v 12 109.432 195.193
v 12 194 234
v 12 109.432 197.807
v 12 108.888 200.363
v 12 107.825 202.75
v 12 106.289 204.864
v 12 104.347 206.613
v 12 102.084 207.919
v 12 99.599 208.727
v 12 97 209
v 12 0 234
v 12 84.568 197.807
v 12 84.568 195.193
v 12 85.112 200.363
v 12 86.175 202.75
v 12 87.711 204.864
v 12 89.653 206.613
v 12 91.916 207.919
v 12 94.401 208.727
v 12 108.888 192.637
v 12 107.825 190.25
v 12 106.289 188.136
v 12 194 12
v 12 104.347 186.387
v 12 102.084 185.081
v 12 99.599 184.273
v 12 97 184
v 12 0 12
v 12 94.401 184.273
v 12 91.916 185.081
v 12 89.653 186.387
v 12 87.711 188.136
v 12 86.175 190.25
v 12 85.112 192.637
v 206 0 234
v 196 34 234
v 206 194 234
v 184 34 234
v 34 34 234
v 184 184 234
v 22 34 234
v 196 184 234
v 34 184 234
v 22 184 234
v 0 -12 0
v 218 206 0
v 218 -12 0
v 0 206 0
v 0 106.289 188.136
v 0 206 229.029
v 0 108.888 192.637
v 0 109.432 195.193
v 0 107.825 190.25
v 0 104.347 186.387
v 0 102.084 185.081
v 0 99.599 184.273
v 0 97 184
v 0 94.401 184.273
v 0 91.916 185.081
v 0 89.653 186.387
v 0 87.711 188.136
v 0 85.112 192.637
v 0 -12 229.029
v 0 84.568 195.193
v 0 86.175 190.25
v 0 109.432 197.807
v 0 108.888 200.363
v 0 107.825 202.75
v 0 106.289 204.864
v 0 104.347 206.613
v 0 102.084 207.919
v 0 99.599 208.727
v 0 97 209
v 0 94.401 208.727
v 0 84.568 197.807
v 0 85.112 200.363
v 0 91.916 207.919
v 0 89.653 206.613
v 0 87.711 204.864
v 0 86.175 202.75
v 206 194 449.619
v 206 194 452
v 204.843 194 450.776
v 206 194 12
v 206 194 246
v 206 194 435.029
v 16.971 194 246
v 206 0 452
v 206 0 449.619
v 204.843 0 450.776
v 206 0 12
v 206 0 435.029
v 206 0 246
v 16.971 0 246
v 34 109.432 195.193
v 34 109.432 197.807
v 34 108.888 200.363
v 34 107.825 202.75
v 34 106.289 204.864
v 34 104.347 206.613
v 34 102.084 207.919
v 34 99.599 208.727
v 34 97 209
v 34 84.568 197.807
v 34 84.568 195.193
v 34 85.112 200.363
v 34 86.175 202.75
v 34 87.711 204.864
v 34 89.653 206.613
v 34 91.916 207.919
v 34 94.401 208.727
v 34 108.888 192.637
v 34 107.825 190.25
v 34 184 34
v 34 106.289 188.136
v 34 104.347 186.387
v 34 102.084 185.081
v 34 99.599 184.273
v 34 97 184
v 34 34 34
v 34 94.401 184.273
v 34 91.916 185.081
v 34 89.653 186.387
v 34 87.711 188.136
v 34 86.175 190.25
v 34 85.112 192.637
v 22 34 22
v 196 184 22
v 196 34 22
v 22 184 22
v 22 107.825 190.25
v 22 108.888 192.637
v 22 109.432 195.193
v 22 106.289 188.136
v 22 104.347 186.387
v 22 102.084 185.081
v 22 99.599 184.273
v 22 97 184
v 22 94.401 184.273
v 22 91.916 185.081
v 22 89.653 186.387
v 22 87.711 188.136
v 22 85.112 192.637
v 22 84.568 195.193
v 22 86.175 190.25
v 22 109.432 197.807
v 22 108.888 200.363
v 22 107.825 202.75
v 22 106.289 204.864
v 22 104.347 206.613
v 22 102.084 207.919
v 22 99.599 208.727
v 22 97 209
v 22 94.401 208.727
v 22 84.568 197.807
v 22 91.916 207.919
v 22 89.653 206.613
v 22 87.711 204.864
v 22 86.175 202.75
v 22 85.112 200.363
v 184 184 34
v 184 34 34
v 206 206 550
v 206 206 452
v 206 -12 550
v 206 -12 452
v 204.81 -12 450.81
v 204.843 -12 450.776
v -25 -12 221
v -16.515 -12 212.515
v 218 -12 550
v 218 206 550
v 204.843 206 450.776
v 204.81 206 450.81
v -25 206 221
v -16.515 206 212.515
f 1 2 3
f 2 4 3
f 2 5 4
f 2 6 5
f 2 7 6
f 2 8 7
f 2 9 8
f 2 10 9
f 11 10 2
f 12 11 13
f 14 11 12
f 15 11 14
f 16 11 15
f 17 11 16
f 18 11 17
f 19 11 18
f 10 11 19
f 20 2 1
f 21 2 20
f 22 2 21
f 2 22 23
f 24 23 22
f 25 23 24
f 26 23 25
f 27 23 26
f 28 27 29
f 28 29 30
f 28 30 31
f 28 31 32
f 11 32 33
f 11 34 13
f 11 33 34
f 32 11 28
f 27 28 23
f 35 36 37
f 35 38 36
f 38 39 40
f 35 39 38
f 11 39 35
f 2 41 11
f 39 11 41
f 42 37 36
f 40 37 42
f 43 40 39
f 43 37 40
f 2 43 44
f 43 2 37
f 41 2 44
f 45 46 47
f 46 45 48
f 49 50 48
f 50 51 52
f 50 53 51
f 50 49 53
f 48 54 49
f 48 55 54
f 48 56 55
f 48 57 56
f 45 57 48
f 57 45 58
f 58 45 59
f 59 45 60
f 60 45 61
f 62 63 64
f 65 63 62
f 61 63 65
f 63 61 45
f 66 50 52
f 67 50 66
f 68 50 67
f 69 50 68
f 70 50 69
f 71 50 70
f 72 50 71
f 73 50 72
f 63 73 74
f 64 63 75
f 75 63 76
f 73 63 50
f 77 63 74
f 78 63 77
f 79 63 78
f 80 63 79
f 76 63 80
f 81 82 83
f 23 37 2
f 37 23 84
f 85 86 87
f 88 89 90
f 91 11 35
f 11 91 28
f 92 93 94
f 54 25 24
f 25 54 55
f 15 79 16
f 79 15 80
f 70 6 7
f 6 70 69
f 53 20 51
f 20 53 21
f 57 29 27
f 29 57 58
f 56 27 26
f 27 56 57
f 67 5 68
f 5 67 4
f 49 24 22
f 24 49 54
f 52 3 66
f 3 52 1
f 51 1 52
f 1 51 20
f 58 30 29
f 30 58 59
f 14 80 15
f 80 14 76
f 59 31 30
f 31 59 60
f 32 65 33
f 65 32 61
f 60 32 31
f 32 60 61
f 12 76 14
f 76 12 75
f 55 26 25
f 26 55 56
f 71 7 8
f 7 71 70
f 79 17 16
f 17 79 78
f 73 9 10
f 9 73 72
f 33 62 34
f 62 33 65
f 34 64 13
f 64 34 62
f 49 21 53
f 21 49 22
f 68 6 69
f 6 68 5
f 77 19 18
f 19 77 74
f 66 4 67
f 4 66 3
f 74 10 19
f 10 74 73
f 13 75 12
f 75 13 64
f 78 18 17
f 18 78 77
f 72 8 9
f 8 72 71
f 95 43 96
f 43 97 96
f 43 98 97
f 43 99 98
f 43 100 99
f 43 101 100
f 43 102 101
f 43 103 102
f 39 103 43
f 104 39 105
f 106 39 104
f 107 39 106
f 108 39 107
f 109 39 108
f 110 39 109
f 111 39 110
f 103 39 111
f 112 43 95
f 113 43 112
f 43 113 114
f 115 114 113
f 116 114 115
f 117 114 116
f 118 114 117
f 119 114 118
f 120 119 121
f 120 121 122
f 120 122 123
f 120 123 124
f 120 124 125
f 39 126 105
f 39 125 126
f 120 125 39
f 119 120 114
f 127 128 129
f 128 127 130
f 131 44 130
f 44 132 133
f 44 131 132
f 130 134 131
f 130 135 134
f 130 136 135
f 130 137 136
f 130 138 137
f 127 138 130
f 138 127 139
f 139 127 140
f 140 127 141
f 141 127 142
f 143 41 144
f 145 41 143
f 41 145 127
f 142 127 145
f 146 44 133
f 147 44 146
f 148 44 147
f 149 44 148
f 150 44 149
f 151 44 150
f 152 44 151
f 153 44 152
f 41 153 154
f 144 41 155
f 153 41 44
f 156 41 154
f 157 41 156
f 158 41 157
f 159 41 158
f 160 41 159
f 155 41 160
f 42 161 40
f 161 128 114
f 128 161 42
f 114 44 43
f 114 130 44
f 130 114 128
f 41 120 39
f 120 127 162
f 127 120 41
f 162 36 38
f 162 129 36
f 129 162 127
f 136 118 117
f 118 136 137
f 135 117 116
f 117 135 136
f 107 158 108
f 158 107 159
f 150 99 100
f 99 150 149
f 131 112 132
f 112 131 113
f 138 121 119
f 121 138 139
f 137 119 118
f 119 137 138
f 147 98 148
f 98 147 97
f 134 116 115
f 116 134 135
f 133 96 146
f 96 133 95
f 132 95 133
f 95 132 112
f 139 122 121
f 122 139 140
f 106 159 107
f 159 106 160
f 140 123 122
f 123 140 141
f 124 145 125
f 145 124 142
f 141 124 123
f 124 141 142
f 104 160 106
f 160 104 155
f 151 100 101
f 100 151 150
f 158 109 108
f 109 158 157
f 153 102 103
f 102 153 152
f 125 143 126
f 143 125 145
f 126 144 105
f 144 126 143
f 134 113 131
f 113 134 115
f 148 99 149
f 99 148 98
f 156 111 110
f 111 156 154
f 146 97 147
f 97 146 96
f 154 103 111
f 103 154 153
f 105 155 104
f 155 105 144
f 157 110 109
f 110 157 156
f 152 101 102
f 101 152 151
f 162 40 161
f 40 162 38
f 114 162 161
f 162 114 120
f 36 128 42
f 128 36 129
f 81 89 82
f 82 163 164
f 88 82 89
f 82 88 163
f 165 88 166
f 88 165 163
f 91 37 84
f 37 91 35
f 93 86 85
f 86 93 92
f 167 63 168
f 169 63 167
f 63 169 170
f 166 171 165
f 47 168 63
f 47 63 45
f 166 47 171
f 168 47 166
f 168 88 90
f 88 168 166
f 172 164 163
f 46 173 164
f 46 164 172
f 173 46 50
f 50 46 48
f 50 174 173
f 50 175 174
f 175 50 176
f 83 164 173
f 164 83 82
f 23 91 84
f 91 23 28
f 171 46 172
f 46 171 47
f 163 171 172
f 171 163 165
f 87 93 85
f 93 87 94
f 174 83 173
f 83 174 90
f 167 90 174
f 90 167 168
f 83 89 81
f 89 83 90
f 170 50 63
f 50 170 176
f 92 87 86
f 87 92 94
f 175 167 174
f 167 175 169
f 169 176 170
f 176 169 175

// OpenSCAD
//bottom plank (red)
color([1, 0, 0]) translate([12, 0, 0]) cube([194, 194, 12]);

//back plank (blue)
color([0, 0, 1]) translate([206, -12, 0]) cube([12, 218, 550]);

difference() {
	//front plank (green)
	color([0, 1, 0]) cube([12, 194, 234]);
	//hole
	translate([-10, 97, 196.5]) rotate(90, [0, 1, 0])
	    cylinder(44, 12.5, 12.5, false);
};

//top plank (red)
color([1, 0, 0]) translate([0, 0, 234]) cube([206, 194, 12]);

//top plank (yellow)
color([1,1,0]) translate([-25, -12, 221]) rotate(45, [0,1,0]) cube([12, 218, 325]);

//bird section
translate([0,0,0]) {
    
    //bottom plank (yellow)
    translate([34, 34, 22]) cube([150, 150, 12]);
    
    //back plank (green) 
    color([0, 1, 0]) translate([184, 34, 22]) cube([12, 150, 215]);
    
    difference() {
	//front plank (blue)
	color([0, 0, 1]) translate([22, 34, 22]) cube([12, 150, 215]);
	//hole
	translate([-10, 97, 196.5]) rotate(90, [0, 1, 0])
	    cylinder(49, 12.5, 12.5, false);
    };
};

//side planks (turquoise)
color([0, 1, 1]) translate([0, 0, 0]) {
    
    //left side (from front)
    translate([0, -12, 0]) {
        //square section
        cube([206, 12, 234]);
        
        //triangle section
        translate([0, 12, 234])
        rotate(90, [1, 0, 0])
        linear_extrude(height = 12)
        polygon([[0, 0], [206, 0], [206, 218]]);
    }
    
    //right side (from front)
    translate([0, 194, 0]) {
        //square section
        cube([206, 12, 234]);
        
        //triangle section
        translate([0, 12, 234])
        rotate(90, [1, 0, 0])
        linear_extrude(height = 12)
        polygon([[0, 0], [206, 0], [206, 218]]);
        
    }
    
    
};
